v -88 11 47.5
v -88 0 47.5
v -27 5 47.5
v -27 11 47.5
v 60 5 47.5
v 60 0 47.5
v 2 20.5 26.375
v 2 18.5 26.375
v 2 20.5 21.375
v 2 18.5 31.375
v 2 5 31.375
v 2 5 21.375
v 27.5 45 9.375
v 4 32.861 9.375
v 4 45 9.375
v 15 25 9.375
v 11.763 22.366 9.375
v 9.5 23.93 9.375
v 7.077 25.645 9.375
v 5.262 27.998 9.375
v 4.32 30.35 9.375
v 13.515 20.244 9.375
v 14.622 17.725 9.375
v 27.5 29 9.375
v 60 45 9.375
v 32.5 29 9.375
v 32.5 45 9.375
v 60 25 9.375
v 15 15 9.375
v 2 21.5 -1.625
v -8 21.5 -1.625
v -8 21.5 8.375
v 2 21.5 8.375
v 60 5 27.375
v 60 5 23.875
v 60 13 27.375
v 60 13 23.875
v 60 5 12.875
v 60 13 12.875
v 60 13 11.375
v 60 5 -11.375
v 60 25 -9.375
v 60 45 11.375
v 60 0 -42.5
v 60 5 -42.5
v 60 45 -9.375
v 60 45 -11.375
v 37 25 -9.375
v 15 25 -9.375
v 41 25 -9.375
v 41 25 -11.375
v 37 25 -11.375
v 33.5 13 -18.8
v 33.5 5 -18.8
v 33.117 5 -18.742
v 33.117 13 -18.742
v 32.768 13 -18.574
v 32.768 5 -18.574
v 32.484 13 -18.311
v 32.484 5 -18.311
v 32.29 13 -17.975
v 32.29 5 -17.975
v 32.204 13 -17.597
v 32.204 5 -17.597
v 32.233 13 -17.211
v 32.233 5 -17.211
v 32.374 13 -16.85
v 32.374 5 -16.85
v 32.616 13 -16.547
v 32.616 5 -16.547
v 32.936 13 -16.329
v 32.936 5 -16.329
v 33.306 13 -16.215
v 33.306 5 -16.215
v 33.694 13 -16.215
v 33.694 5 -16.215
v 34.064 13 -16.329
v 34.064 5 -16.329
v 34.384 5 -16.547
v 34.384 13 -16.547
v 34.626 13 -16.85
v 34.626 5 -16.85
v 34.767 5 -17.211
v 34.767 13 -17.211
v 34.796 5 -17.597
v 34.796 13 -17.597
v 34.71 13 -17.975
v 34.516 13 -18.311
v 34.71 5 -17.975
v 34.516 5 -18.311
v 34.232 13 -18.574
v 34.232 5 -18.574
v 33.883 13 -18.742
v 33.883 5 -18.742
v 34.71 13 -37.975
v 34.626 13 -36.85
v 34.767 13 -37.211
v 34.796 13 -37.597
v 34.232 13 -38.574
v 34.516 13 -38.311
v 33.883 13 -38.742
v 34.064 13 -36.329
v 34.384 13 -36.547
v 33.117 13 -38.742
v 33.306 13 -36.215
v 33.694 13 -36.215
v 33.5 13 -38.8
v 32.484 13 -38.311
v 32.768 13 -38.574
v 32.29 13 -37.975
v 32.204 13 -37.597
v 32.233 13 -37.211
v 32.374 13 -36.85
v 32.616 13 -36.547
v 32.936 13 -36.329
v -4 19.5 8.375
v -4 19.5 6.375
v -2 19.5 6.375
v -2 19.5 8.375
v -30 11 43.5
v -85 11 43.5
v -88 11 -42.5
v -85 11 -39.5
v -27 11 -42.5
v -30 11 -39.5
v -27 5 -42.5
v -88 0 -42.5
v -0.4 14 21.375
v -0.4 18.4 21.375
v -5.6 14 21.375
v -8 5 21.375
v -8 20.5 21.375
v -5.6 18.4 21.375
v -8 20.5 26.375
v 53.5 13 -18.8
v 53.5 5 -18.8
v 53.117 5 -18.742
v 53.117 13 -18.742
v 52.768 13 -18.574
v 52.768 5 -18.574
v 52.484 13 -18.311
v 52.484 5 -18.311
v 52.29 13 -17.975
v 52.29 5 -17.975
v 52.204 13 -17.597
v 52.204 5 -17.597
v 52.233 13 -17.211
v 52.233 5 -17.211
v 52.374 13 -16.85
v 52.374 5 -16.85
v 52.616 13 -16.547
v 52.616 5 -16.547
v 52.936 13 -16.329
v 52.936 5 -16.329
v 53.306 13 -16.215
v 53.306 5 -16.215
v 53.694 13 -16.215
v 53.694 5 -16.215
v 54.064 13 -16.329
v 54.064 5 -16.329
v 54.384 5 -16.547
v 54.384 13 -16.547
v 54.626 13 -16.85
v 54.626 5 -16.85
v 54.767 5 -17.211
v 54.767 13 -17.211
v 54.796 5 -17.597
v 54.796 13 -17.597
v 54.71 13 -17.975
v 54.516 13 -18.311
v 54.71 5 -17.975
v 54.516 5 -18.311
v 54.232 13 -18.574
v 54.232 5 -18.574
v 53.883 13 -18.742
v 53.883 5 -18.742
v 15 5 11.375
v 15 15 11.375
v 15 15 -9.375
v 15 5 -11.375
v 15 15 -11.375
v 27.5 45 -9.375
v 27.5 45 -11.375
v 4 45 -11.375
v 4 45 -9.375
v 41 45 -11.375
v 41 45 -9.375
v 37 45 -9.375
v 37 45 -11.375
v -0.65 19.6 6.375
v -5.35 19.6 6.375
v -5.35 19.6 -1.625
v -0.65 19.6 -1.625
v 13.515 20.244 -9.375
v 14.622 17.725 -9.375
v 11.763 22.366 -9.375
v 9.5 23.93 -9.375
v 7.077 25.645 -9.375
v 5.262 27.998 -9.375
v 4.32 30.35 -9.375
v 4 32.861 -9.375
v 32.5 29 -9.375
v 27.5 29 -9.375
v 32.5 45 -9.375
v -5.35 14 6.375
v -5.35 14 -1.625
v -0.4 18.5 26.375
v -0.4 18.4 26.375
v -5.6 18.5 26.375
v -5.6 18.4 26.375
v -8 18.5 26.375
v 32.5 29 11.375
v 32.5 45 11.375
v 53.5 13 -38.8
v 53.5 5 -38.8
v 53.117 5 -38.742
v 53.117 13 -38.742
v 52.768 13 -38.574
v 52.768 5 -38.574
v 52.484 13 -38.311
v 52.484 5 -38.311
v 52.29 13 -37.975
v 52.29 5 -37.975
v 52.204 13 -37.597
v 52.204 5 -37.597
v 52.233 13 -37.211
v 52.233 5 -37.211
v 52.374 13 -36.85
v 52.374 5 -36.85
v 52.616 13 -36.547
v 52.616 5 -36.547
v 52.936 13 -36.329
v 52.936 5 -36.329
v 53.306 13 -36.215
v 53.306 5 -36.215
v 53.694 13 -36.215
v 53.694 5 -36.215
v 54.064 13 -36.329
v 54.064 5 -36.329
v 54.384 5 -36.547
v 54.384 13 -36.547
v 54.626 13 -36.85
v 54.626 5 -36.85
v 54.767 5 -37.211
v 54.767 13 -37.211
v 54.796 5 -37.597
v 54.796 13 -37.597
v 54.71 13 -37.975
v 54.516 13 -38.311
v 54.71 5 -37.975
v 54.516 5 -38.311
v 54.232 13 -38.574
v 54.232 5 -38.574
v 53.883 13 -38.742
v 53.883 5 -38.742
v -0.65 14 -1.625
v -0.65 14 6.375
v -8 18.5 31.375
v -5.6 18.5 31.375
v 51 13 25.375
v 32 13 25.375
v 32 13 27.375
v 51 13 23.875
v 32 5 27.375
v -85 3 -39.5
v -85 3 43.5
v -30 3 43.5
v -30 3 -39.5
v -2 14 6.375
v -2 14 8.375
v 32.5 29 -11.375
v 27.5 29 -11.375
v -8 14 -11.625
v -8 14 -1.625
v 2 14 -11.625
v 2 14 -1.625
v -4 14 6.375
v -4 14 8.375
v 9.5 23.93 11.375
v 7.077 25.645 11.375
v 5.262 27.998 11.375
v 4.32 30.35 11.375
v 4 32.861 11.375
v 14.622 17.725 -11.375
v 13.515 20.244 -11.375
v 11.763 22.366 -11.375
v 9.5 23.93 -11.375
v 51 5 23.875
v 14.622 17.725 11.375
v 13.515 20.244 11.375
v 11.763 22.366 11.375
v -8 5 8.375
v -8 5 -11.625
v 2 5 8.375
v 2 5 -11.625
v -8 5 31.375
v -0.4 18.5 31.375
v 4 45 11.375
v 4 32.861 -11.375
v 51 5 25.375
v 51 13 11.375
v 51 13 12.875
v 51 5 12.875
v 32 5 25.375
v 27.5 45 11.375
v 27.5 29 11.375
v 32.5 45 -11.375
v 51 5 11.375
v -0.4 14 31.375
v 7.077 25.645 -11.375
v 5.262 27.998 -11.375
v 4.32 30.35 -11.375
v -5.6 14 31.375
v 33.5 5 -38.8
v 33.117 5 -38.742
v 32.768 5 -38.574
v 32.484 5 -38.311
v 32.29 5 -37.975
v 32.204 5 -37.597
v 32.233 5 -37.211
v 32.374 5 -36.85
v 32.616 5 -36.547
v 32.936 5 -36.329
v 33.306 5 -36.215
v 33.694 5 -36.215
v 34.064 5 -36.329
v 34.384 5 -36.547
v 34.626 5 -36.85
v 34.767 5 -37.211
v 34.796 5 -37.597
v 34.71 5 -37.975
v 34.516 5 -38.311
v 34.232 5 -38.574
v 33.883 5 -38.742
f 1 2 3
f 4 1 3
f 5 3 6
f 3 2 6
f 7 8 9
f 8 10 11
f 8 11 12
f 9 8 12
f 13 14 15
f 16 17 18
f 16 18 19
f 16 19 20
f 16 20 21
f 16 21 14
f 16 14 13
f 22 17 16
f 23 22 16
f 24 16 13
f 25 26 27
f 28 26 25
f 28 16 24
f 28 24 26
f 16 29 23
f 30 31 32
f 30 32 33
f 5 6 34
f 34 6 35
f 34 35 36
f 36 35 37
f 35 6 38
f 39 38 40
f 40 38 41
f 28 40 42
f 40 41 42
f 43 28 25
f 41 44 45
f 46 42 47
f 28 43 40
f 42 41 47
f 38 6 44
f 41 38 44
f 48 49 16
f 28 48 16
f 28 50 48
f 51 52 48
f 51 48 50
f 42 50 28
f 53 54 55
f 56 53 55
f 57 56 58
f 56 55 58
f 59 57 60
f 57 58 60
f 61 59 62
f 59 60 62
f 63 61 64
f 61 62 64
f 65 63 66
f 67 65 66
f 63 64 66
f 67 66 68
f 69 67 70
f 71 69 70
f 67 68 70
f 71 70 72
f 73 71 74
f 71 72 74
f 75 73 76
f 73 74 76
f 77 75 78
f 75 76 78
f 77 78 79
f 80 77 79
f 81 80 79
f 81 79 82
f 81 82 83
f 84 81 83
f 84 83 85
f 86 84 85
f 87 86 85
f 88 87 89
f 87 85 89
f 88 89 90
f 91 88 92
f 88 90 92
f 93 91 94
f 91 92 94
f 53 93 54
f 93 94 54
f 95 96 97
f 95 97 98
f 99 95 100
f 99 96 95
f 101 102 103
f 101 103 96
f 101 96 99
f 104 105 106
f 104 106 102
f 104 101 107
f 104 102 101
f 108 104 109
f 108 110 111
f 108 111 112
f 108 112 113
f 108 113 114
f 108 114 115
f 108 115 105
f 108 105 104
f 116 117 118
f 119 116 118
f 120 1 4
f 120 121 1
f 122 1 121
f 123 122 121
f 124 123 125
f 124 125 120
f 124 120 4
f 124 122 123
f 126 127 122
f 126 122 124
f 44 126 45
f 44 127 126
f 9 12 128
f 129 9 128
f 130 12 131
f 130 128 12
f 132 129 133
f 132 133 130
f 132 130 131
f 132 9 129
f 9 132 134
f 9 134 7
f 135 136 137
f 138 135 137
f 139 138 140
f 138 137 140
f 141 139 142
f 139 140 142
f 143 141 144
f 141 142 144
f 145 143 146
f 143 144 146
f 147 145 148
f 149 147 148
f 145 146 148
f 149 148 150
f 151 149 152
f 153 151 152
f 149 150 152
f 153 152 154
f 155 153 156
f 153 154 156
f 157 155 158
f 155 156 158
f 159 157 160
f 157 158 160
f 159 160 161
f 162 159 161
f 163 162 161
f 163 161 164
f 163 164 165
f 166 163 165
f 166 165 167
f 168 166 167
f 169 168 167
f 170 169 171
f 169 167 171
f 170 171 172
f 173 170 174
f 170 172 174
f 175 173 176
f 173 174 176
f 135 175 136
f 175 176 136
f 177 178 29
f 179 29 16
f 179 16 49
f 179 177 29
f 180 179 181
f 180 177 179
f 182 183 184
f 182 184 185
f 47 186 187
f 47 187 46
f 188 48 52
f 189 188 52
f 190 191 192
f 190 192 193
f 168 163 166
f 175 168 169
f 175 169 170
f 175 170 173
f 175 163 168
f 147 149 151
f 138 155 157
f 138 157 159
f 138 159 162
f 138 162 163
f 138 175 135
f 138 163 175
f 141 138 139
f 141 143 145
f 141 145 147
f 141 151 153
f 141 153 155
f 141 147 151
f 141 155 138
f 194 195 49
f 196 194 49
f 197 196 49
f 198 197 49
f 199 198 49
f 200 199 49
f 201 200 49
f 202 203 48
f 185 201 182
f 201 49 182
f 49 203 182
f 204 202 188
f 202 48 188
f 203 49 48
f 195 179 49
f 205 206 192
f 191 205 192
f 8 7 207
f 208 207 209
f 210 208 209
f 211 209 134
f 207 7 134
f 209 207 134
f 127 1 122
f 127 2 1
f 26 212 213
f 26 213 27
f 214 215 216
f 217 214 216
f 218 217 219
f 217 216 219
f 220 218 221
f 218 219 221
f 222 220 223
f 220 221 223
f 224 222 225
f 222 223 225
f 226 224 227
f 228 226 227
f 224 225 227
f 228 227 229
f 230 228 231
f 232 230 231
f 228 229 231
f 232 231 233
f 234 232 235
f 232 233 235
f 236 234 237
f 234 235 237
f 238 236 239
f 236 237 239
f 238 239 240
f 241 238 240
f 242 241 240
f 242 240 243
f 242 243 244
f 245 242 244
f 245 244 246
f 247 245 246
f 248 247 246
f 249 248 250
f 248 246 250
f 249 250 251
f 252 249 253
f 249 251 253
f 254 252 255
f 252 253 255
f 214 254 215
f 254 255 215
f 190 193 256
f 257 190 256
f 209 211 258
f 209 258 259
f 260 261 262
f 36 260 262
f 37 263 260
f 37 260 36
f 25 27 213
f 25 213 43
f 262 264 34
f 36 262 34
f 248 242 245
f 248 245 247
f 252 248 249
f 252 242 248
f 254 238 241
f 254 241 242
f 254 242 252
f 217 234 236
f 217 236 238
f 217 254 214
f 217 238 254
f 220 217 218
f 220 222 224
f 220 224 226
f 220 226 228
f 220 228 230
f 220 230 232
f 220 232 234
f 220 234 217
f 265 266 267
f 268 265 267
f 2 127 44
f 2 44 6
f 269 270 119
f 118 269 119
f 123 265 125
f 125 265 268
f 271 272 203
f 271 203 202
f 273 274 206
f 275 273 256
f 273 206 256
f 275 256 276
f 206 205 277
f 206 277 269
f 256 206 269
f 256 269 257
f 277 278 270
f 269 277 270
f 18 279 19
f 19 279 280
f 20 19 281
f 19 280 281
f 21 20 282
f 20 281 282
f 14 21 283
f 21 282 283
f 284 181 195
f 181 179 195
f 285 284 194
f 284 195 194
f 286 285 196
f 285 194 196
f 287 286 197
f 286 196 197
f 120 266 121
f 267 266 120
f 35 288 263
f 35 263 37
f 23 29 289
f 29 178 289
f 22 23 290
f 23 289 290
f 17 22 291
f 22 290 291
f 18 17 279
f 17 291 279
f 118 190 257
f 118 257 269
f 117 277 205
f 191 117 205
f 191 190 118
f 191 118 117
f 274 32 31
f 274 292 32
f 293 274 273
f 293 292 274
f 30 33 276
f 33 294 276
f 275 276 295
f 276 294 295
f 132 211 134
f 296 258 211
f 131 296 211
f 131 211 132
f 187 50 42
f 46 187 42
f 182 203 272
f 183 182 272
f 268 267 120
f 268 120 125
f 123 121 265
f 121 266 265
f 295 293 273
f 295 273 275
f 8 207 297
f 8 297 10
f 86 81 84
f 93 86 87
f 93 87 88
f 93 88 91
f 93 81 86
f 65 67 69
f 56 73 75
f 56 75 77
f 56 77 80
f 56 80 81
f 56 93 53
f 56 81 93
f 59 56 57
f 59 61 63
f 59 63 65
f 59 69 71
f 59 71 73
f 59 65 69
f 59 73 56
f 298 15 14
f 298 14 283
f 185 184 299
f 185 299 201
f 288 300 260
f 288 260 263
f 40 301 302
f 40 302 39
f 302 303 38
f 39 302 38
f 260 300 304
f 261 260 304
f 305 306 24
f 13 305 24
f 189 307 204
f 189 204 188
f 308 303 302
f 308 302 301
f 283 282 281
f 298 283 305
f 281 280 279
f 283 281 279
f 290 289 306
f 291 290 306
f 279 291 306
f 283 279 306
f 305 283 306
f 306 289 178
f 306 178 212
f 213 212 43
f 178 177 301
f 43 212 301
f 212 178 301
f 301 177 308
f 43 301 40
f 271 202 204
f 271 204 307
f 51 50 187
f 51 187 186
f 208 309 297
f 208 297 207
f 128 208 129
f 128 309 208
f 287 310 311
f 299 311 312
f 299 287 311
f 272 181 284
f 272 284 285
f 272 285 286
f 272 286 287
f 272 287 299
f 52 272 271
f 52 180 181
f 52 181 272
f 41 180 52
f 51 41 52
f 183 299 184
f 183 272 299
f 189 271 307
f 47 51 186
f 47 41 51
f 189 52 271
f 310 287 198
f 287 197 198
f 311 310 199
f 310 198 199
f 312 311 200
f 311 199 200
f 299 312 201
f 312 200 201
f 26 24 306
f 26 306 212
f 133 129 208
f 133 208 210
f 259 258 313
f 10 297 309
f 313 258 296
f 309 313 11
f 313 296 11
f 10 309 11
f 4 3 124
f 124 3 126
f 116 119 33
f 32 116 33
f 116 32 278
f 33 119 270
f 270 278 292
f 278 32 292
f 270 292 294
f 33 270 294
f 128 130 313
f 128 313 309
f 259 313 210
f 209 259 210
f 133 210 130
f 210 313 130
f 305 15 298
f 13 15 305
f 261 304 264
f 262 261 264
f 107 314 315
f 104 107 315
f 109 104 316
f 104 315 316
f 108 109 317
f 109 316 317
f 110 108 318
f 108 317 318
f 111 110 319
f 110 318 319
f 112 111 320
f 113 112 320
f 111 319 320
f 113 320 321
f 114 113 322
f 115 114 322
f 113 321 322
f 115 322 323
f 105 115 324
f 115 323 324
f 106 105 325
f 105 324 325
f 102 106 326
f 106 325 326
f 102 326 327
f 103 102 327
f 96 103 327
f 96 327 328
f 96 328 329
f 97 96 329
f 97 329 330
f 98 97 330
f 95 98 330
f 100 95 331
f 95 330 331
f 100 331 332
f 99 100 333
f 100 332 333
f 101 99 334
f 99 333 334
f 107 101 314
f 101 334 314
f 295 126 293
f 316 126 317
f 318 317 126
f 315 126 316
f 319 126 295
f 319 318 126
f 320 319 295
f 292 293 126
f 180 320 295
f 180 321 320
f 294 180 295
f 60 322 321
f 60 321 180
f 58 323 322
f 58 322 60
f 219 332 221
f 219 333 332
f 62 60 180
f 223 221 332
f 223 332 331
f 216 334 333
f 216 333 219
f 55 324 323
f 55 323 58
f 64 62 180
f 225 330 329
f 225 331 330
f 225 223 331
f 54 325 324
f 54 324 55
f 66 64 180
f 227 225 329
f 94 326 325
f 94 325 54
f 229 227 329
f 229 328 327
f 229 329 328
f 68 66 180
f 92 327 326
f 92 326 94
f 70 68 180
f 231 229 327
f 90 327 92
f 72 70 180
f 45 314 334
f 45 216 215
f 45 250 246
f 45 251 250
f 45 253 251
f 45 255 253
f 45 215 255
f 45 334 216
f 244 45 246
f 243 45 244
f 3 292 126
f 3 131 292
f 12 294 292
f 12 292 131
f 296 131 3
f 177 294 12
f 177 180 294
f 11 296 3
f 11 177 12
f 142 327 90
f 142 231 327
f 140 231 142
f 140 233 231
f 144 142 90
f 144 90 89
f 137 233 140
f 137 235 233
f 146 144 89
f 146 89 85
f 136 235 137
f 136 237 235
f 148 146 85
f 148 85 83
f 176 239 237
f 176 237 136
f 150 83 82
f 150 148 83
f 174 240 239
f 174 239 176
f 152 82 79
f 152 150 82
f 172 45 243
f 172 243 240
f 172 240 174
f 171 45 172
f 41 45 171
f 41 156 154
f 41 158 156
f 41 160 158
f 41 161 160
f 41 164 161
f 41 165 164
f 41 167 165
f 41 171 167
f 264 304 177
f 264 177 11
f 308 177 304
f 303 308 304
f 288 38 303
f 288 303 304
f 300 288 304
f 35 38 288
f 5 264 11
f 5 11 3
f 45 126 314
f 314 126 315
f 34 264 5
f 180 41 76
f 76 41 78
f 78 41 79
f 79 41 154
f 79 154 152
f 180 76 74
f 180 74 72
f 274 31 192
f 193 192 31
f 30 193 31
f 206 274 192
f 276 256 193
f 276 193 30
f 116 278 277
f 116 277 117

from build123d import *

# Parameters (mm, degrees)
SKETCH3_W               = 120
SKETCH3_H               = 85
BOSS_EXTRUDE1_DEPTH     = 5
SKETCH4_W               = 45
SKETCH4_H               = 18.75
BOSS_EXTRUDE2_DEPTH     = 20
SKETCH6_W               = 45
SKETCH6_H               = 2
BOSS_EXTRUDE3_DEPTH     = 40
CUT_EXTRUDE1_DEPTH      = 87.204698248
CUT_EXTRUDE1_DEPTH_BACK = 20
SKETCH7_W               = 4
SKETCH7_H               = 2
SKETCH8_W               = 10
SKETCH8_H               = 20
BOSS_EXTRUDE4_DEPTH     = 9
BOSS_EXTRUDE5_DEPTH     = 5.5
SKETCH10_W              = 2
SKETCH10_H              = 5.5
CUT_EXTRUDE2_DEPTH      = 91.627068942
SKETCH11_W              = 10
SKETCH11_H              = 10
BOSS_EXTRUDE6_DEPTH     = 2
SKETCH12_W              = 10
SKETCH12_H              = 10
BOSS_EXTRUDE7_DEPTH     = 9
SKETCH13_W              = 2.4
SKETCH13_H              = 10
BOSS_EXTRUDE8_DEPTH     = 4.5
SKETCH14_W              = 10
SKETCH14_H              = 5
BOSS_EXTRUDE9_DEPTH     = 2
SKETCH15_R              = 1.3
BOSS_EXTRUDE10_DEPTH    = 8
SKETCH16_W              = 9
SKETCH16_H              = 1.5
BOSS_EXTRUDE11_DEPTH    = 8
SKETCH18_W              = 120
SKETCH18_H              = 5
BOSS_EXTRUDE12_DEPTH    = 5
SKETCH19_W              = 90
SKETCH19_H              = 5
BOSS_EXTRUDE13_DEPTH    = 30
SKETCH17_W              = 55
SKETCH17_H              = 83
CUT_EXTRUDE3_DEPTH      = 2
SKETCH20_W              = 61
SKETCH20_H              = 90
SKETCH20_W_2            = 55
SKETCH20_H_2            = 83
BOSS_EXTRUDE14_DEPTH    = 6
SKETCH21_W              = 2
SKETCH21_H              = 90
CUT_EXTRUDE4_DEPTH      = 110.344638643
SKETCH22_W              = 5
SKETCH22_H              = 22.75
CUT_EXTRUDE5_DEPTH      = 16
SKETCH23_W              = 2
SKETCH23_H              = 20
BOSS_EXTRUDE15_DEPTH    = 11
FILLET1_R               = 10
FILLET2_R               = 10
SKETCH24_W              = 0.1
SKETCH24_H              = 5.5
CUT_EXTRUDE6_DEPTH      = 8
SKETCH25_W              = 5.2
SKETCH25_H              = 0.1
BOSS_EXTRUDE16_DEPTH    = 5


with BuildPart() as part:
    # Sketch3 → Boss-Extrude1 (new body)
    with BuildSketch(Plane(origin=(0, 0, 0), x_dir=(1, 0, 0), z_dir=(0, 1, 0))):
        Rectangle(SKETCH3_W, SKETCH3_H)
    extrude(amount=BOSS_EXTRUDE1_DEPTH)

    # Sketch4 → Boss-Extrude2 (add)
    with BuildSketch(Plane(origin=(0, 5, 0), x_dir=(1, 0, 0), z_dir=(0, 1, 0))):
        with Locations((37.5, 0)):
            Rectangle(SKETCH4_W, SKETCH4_H)
    extrude(amount=BOSS_EXTRUDE2_DEPTH)

    # Sketch6 → Boss-Extrude3 (add)
    with BuildSketch(Plane(origin=(0, 5, 0), x_dir=(1, 0, 0), z_dir=(0, 1, 0))):
        with Locations((37.5, 10.375)):
            Rectangle(SKETCH6_W, SKETCH6_H)
        with Locations((37.5, -10.375)):
            Rectangle(SKETCH6_W, SKETCH6_H)
    extrude(amount=BOSS_EXTRUDE3_DEPTH)

    # Sketch7 → Cut-Extrude1 (cut, two sides: drawn at the far end of the back side and taken through both)
    with BuildSketch(Plane(origin=(0, 45, 0), x_dir=(1, 0, 0), z_dir=(0, 1, 0)).offset(-CUT_EXTRUDE1_DEPTH_BACK)):
        with Locations((39, 10.375)):
            Rectangle(SKETCH7_W, SKETCH7_H)
    extrude(amount=CUT_EXTRUDE1_DEPTH + CUT_EXTRUDE1_DEPTH_BACK, mode=Mode.SUBTRACT)

    # Sketch8 → Boss-Extrude4 (add)
    with BuildSketch(Plane(origin=(0, 5, 0), x_dir=(1, 0, 0), z_dir=(0, 1, 0))):
        with Locations((-3, 1.625)):
            Rectangle(SKETCH8_W, SKETCH8_H)
    extrude(amount=BOSS_EXTRUDE4_DEPTH)

    # Sketch9 → Boss-Extrude5 (add)
    with BuildSketch(Plane(origin=(0, 14, 0), x_dir=(1, 0, 0), z_dir=(0, 1, 0))):
        Polygon((-8, -8.375), (2, -8.375), (2, 1.625), (-0.75, 1.625), (-0.75, -6.375), (-5.25, -6.375), (-5.25, 1.625), (-8, 1.625), align=None)
    extrude(amount=BOSS_EXTRUDE5_DEPTH)

    # Sketch10 → Cut-Extrude2 (cut, through all)
    with BuildSketch(Plane.XY.offset(8.375)):
        with Locations((-3, 16.75)):
            Rectangle(SKETCH10_W, SKETCH10_H)
    extrude(amount=-CUT_EXTRUDE2_DEPTH, mode=Mode.SUBTRACT)

    # Sketch11 → Boss-Extrude6 (add)
    with BuildSketch(Plane(origin=(0, 19.5, 0), x_dir=(1, 0, 0), z_dir=(0, 1, 0))):
        with Locations((-3, -3.375)):
            Rectangle(SKETCH11_W, SKETCH11_H)
    extrude(amount=BOSS_EXTRUDE6_DEPTH)

    # Sketch12 → Boss-Extrude7 (add)
    with BuildSketch(Plane(origin=(0, 5, 0), x_dir=(1, 0, 0), z_dir=(0, 1, 0))):
        with Locations((-3, -26.375)):
            Rectangle(SKETCH12_W, SKETCH12_H)
    extrude(amount=BOSS_EXTRUDE7_DEPTH)

    # Sketch13 → Boss-Extrude8 (add)
    with BuildSketch(Plane(origin=(0, 14, 0), x_dir=(1, 0, 0), z_dir=(0, 1, 0))):
        with Locations((-6.8, -26.375)):
            Rectangle(SKETCH13_W, SKETCH13_H)
        with Locations((0.8, -26.375)):
            Rectangle(SKETCH13_W, SKETCH13_H)
    extrude(amount=BOSS_EXTRUDE8_DEPTH)

    # Sketch14 → Boss-Extrude9 (add)
    with BuildSketch(Plane(origin=(0, 18.5, 0), x_dir=(1, 0, 0), z_dir=(0, 1, 0))):
        with Locations((-3, -23.875)):
            Rectangle(SKETCH14_W, SKETCH14_H)
    extrude(amount=BOSS_EXTRUDE9_DEPTH)

    # Sketch15 → Boss-Extrude10 (add)
    with BuildSketch(Plane(origin=(0, 5, 0), x_dir=(1, 0, 0), z_dir=(0, 1, 0))):
        with Locations(Location((33.5, 37.5, 0), (0, 0, 90))):
            Circle(SKETCH15_R)
        with Locations(Location((53.5, 37.5, 0), (0, 0, 90))):
            Circle(SKETCH15_R)
        with Locations(Location((53.5, 17.5, 0), (0, 0, 90))):
            Circle(SKETCH15_R)
        with Locations(Location((33.5, 17.5, 0), (0, 0, 90))):
            Circle(SKETCH15_R)
    extrude(amount=BOSS_EXTRUDE10_DEPTH)

    # Sketch16 → Boss-Extrude11 (add)
    with BuildSketch(Plane(origin=(0, 5, 0), x_dir=(1, 0, 0), z_dir=(0, 1, 0))):
        with Locations((55.5, -12.125)):
            Rectangle(SKETCH16_W, SKETCH16_H)
        Polygon((51, -25.375), (32, -25.375), (32, -27.375), (60, -27.375), (60, -25.375), align=None)
        with Locations((55.5, -24.625)):
            Rectangle(SKETCH16_W, SKETCH16_H)
    extrude(amount=BOSS_EXTRUDE11_DEPTH)

    # Sketch18 → Boss-Extrude12 (add)
    with BuildSketch(Plane.XY.offset(42.5)):
        with Locations((0, 2.5)):
            Rectangle(SKETCH18_W, SKETCH18_H)
    extrude(amount=BOSS_EXTRUDE12_DEPTH)

    # Sketch19 → Boss-Extrude13 (add)
    with BuildSketch(Plane.ZY.offset(60)):
        with Locations((2.5, 2.5)):
            Rectangle(SKETCH19_W, SKETCH19_H)
    extrude(amount=BOSS_EXTRUDE13_DEPTH)

    # Sketch17 → Cut-Extrude3 (cut)
    with BuildSketch(Plane(origin=(0, 5, 0), x_dir=(1, 0, 0), z_dir=(0, 1, 0))):
        with Locations((-57.5, -2)):
            Rectangle(SKETCH17_W, SKETCH17_H)
    extrude(amount=-CUT_EXTRUDE3_DEPTH, mode=Mode.SUBTRACT)

    # Sketch20 → Boss-Extrude14 (add)
    with BuildSketch(Plane(origin=(0, 5, 0), x_dir=(1, 0, 0), z_dir=(0, 1, 0))):
        with Locations((-57.5, -2.5)):
            Rectangle(SKETCH20_W, SKETCH20_H)
        with Locations((-57.5, -2)):
            Rectangle(SKETCH20_W_2, SKETCH20_H_2, mode=Mode.SUBTRACT)
    extrude(amount=BOSS_EXTRUDE14_DEPTH)

    # Sketch21 → Cut-Extrude4 (cut, through all)
    with BuildSketch(Plane(origin=(0, 5, 0), x_dir=(1, 0, 0), z_dir=(0, 1, 0))):
        with Locations((-89, -2.5)):
            Rectangle(SKETCH21_W, SKETCH21_H)
    extrude(amount=-CUT_EXTRUDE4_DEPTH, mode=Mode.SUBTRACT)

    # Sketch22 → Cut-Extrude5 (cut)
    with BuildSketch(Plane(origin=(0, 45, 0), x_dir=(1, 0, 0), z_dir=(0, 1, 0))):
        with Locations((30, 0)):
            Rectangle(SKETCH22_W, SKETCH22_H)
    extrude(amount=-CUT_EXTRUDE5_DEPTH, mode=Mode.SUBTRACT)

    # Sketch23 → Boss-Extrude15 (add)
    with BuildSketch(Plane.ZY.offset(-15)):
        with Locations((-10.375, 35)):
            Rectangle(SKETCH23_W, SKETCH23_H)
        with Locations((10.375, 35)):
            Rectangle(SKETCH23_W, SKETCH23_H)
    extrude(amount=BOSS_EXTRUDE15_DEPTH)

    # Fillet1
    fillet1_edges = [part.edges().sort_by_distance(p)[0] for p in [
        (15, 25, -10.375),
        (15, 25, 10.375),
    ]]
    fillet(fillet1_edges, radius=FILLET1_R)

    # Fillet2
    fillet2_edges = [part.edges().sort_by_distance(p)[0] for p in [
        (4, 25, -10.375),
        (4, 25, 10.375),
    ]]
    fillet(fillet2_edges, radius=FILLET2_R)

    # Sketch24 → Cut-Extrude6 (cut)
    with BuildSketch(Plane(origin=(0, 0, -1.625), x_dir=(-1, 0, 0), z_dir=(0, 0, -1))):
        Polygon((0.75, 19.5), (5.25, 19.5), (5.35, 19.5), (5.35, 19.6), (0.65, 19.6), (0.65, 19.5), align=None)
        with Locations((5.3, 16.75)):
            Rectangle(SKETCH24_W, SKETCH24_H)
        with Locations((0.7, 16.75)):
            Rectangle(SKETCH24_W, SKETCH24_H)
    extrude(amount=-CUT_EXTRUDE6_DEPTH, mode=Mode.SUBTRACT)

    # Sketch25 → Boss-Extrude16 (add)
    with BuildSketch(Plane(origin=(0, 0, 21.375), x_dir=(-1, 0, 0), z_dir=(0, 0, -1))):
        with Locations((3, 18.45)):
            Rectangle(SKETCH25_W, SKETCH25_H)
    extrude(amount=-BOSS_EXTRUDE16_DEPTH)


solid = part.part
